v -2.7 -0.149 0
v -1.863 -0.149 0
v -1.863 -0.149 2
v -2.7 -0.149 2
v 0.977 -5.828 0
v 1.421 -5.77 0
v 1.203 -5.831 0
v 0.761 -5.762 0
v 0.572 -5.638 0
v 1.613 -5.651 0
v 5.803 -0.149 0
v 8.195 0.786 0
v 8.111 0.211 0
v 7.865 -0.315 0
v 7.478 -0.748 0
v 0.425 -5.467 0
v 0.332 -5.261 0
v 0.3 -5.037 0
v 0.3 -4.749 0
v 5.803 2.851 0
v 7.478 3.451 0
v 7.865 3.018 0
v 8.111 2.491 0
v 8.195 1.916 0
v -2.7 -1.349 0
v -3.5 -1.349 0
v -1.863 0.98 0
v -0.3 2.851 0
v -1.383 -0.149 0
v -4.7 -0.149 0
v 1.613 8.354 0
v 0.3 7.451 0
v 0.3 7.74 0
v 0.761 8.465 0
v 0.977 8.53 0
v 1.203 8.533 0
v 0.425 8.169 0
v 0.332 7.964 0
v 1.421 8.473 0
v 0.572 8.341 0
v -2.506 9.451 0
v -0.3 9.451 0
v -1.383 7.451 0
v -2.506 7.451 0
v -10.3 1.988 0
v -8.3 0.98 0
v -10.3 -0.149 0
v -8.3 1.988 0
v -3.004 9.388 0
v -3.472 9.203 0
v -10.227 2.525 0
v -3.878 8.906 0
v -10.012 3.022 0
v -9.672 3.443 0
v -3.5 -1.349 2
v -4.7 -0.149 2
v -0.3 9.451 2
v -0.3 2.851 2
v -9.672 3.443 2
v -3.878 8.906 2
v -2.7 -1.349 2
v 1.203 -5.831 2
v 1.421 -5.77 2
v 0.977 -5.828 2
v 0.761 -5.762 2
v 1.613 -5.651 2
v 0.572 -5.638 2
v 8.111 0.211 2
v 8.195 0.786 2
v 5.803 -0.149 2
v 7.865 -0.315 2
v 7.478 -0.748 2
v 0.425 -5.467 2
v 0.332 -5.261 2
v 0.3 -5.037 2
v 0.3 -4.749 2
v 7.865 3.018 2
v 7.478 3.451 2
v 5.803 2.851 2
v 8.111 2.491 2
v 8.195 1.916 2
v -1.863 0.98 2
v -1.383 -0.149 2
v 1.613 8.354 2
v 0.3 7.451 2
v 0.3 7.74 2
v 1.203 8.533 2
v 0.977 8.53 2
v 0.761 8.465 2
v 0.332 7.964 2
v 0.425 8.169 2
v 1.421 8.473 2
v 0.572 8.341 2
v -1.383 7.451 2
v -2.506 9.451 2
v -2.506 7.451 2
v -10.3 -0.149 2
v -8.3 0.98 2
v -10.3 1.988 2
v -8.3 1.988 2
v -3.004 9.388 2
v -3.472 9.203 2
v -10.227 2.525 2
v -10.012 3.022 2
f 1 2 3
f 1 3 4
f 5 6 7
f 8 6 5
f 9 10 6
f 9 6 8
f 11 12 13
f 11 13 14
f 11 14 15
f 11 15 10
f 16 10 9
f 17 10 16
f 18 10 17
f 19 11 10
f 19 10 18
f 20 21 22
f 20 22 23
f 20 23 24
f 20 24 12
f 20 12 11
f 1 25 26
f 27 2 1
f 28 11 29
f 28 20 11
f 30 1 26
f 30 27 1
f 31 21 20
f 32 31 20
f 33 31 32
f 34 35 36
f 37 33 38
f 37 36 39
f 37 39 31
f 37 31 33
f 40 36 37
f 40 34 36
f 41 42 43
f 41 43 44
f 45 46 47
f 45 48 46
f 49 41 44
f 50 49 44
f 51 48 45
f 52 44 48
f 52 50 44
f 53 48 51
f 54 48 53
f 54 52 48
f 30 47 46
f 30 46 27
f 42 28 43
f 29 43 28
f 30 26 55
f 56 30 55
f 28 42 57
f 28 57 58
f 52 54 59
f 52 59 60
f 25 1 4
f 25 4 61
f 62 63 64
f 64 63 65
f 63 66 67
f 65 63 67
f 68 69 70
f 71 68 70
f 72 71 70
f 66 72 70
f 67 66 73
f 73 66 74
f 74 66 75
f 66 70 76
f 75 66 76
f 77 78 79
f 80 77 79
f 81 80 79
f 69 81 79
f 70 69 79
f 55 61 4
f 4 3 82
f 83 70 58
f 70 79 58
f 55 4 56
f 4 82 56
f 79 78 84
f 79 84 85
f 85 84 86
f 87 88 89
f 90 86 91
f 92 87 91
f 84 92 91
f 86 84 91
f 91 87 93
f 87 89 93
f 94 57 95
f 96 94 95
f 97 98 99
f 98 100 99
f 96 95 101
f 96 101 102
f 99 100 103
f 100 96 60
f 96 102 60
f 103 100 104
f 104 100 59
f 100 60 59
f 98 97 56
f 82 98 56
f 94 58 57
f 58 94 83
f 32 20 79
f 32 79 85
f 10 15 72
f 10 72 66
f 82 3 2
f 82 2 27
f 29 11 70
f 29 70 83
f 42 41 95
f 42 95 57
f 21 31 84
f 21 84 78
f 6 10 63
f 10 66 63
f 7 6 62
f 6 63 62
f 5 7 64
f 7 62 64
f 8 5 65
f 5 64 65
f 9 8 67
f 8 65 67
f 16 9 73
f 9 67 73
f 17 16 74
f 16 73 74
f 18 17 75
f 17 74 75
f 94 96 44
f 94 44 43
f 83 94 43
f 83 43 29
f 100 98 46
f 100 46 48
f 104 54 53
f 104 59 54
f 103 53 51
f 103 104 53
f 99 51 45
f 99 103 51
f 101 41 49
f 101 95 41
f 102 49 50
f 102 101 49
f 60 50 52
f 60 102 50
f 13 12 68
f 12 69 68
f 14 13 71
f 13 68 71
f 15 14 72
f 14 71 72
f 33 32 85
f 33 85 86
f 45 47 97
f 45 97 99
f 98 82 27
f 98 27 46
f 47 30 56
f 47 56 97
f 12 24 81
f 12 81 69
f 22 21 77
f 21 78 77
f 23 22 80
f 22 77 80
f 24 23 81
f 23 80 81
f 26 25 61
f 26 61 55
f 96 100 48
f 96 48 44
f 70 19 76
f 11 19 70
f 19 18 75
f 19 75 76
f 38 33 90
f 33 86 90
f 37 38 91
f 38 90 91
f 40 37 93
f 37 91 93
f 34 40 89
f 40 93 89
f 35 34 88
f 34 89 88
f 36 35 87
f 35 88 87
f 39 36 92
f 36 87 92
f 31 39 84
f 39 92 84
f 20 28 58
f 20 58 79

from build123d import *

# Parameters (mm, degrees)
BOSS_EXTRUDE1_DEPTH = 2
FILLET1_R           = 0.8
FILLET2_R           = 2
CUT_EXTRUDE1_DEPTH  = 15.121515427
CHAMFER1_SIZE       = 1.2


with BuildPart() as part:
    # Sketch1 → Boss-Extrude1 (new body)
    with BuildSketch(Plane.XY):
        Polygon((5.802857873, 2.85130668), (0.3, 7.45130668), (0.3, 9.45130668), (8.195404775, 2.85130668), (8.195404775, -0.14869332), (0.3, -6.74869332), (0.3, -4.74869332), (5.802857873, -0.14869332), (-2.7, -0.14869332), (-2.7, -1.34869332), (-4.7, -1.34869332), (-4.7, -0.14869332), (-10.3, -0.14869332), (-10.3, 2.85130668), (-3.3, 9.45130668), (-0.3, 9.45130668), (-0.3, 2.85130668), align=None)
    extrude(amount=BOSS_EXTRUDE1_DEPTH)

    # Fillet1
    fillet1_edges = [part.edges().sort_by_distance(p)[0] for p in [
        (0.3, 9.45130668, 1),
        (0.3, -6.74869332, 1),
    ]]
    fillet(fillet1_edges, radius=FILLET1_R)

    # Fillet2
    fillet2_edges = [part.edges().sort_by_distance(p)[0] for p in [
        (-10.3, 2.85130668, 1),
        (-3.3, 9.45130668, 1),
        (8.195404775, 2.85130668, 1),
        (8.195404775, -0.14869332, 1),
    ]]
    fillet(fillet2_edges, radius=FILLET2_R)

    # Sketch2 → Cut-Extrude1 (cut, through all)
    with BuildSketch(Plane.XY.offset(2)):
        Polygon((-1.383139325, 7.45130668), (-1.383139325, -0.14869332), (-1.863442011, -0.14869332), (-1.863442011, 0.979922786), (-8.3, 0.979922786), (-8.3, 1.988217887), (-2.505814916, 7.45130668), align=None)
    extrude(amount=-CUT_EXTRUDE1_DEPTH, mode=Mode.SUBTRACT)

    # Chamfer1
    chamfer1_edges = [part.edges().sort_by_distance(p)[0] for p in [
        (-4.7, -1.34869332, 1),
    ]]
    chamfer(chamfer1_edges, length=CHAMFER1_SIZE - 0.0001)  # a hair under: the kernel refuses the full size


solid = part.part
